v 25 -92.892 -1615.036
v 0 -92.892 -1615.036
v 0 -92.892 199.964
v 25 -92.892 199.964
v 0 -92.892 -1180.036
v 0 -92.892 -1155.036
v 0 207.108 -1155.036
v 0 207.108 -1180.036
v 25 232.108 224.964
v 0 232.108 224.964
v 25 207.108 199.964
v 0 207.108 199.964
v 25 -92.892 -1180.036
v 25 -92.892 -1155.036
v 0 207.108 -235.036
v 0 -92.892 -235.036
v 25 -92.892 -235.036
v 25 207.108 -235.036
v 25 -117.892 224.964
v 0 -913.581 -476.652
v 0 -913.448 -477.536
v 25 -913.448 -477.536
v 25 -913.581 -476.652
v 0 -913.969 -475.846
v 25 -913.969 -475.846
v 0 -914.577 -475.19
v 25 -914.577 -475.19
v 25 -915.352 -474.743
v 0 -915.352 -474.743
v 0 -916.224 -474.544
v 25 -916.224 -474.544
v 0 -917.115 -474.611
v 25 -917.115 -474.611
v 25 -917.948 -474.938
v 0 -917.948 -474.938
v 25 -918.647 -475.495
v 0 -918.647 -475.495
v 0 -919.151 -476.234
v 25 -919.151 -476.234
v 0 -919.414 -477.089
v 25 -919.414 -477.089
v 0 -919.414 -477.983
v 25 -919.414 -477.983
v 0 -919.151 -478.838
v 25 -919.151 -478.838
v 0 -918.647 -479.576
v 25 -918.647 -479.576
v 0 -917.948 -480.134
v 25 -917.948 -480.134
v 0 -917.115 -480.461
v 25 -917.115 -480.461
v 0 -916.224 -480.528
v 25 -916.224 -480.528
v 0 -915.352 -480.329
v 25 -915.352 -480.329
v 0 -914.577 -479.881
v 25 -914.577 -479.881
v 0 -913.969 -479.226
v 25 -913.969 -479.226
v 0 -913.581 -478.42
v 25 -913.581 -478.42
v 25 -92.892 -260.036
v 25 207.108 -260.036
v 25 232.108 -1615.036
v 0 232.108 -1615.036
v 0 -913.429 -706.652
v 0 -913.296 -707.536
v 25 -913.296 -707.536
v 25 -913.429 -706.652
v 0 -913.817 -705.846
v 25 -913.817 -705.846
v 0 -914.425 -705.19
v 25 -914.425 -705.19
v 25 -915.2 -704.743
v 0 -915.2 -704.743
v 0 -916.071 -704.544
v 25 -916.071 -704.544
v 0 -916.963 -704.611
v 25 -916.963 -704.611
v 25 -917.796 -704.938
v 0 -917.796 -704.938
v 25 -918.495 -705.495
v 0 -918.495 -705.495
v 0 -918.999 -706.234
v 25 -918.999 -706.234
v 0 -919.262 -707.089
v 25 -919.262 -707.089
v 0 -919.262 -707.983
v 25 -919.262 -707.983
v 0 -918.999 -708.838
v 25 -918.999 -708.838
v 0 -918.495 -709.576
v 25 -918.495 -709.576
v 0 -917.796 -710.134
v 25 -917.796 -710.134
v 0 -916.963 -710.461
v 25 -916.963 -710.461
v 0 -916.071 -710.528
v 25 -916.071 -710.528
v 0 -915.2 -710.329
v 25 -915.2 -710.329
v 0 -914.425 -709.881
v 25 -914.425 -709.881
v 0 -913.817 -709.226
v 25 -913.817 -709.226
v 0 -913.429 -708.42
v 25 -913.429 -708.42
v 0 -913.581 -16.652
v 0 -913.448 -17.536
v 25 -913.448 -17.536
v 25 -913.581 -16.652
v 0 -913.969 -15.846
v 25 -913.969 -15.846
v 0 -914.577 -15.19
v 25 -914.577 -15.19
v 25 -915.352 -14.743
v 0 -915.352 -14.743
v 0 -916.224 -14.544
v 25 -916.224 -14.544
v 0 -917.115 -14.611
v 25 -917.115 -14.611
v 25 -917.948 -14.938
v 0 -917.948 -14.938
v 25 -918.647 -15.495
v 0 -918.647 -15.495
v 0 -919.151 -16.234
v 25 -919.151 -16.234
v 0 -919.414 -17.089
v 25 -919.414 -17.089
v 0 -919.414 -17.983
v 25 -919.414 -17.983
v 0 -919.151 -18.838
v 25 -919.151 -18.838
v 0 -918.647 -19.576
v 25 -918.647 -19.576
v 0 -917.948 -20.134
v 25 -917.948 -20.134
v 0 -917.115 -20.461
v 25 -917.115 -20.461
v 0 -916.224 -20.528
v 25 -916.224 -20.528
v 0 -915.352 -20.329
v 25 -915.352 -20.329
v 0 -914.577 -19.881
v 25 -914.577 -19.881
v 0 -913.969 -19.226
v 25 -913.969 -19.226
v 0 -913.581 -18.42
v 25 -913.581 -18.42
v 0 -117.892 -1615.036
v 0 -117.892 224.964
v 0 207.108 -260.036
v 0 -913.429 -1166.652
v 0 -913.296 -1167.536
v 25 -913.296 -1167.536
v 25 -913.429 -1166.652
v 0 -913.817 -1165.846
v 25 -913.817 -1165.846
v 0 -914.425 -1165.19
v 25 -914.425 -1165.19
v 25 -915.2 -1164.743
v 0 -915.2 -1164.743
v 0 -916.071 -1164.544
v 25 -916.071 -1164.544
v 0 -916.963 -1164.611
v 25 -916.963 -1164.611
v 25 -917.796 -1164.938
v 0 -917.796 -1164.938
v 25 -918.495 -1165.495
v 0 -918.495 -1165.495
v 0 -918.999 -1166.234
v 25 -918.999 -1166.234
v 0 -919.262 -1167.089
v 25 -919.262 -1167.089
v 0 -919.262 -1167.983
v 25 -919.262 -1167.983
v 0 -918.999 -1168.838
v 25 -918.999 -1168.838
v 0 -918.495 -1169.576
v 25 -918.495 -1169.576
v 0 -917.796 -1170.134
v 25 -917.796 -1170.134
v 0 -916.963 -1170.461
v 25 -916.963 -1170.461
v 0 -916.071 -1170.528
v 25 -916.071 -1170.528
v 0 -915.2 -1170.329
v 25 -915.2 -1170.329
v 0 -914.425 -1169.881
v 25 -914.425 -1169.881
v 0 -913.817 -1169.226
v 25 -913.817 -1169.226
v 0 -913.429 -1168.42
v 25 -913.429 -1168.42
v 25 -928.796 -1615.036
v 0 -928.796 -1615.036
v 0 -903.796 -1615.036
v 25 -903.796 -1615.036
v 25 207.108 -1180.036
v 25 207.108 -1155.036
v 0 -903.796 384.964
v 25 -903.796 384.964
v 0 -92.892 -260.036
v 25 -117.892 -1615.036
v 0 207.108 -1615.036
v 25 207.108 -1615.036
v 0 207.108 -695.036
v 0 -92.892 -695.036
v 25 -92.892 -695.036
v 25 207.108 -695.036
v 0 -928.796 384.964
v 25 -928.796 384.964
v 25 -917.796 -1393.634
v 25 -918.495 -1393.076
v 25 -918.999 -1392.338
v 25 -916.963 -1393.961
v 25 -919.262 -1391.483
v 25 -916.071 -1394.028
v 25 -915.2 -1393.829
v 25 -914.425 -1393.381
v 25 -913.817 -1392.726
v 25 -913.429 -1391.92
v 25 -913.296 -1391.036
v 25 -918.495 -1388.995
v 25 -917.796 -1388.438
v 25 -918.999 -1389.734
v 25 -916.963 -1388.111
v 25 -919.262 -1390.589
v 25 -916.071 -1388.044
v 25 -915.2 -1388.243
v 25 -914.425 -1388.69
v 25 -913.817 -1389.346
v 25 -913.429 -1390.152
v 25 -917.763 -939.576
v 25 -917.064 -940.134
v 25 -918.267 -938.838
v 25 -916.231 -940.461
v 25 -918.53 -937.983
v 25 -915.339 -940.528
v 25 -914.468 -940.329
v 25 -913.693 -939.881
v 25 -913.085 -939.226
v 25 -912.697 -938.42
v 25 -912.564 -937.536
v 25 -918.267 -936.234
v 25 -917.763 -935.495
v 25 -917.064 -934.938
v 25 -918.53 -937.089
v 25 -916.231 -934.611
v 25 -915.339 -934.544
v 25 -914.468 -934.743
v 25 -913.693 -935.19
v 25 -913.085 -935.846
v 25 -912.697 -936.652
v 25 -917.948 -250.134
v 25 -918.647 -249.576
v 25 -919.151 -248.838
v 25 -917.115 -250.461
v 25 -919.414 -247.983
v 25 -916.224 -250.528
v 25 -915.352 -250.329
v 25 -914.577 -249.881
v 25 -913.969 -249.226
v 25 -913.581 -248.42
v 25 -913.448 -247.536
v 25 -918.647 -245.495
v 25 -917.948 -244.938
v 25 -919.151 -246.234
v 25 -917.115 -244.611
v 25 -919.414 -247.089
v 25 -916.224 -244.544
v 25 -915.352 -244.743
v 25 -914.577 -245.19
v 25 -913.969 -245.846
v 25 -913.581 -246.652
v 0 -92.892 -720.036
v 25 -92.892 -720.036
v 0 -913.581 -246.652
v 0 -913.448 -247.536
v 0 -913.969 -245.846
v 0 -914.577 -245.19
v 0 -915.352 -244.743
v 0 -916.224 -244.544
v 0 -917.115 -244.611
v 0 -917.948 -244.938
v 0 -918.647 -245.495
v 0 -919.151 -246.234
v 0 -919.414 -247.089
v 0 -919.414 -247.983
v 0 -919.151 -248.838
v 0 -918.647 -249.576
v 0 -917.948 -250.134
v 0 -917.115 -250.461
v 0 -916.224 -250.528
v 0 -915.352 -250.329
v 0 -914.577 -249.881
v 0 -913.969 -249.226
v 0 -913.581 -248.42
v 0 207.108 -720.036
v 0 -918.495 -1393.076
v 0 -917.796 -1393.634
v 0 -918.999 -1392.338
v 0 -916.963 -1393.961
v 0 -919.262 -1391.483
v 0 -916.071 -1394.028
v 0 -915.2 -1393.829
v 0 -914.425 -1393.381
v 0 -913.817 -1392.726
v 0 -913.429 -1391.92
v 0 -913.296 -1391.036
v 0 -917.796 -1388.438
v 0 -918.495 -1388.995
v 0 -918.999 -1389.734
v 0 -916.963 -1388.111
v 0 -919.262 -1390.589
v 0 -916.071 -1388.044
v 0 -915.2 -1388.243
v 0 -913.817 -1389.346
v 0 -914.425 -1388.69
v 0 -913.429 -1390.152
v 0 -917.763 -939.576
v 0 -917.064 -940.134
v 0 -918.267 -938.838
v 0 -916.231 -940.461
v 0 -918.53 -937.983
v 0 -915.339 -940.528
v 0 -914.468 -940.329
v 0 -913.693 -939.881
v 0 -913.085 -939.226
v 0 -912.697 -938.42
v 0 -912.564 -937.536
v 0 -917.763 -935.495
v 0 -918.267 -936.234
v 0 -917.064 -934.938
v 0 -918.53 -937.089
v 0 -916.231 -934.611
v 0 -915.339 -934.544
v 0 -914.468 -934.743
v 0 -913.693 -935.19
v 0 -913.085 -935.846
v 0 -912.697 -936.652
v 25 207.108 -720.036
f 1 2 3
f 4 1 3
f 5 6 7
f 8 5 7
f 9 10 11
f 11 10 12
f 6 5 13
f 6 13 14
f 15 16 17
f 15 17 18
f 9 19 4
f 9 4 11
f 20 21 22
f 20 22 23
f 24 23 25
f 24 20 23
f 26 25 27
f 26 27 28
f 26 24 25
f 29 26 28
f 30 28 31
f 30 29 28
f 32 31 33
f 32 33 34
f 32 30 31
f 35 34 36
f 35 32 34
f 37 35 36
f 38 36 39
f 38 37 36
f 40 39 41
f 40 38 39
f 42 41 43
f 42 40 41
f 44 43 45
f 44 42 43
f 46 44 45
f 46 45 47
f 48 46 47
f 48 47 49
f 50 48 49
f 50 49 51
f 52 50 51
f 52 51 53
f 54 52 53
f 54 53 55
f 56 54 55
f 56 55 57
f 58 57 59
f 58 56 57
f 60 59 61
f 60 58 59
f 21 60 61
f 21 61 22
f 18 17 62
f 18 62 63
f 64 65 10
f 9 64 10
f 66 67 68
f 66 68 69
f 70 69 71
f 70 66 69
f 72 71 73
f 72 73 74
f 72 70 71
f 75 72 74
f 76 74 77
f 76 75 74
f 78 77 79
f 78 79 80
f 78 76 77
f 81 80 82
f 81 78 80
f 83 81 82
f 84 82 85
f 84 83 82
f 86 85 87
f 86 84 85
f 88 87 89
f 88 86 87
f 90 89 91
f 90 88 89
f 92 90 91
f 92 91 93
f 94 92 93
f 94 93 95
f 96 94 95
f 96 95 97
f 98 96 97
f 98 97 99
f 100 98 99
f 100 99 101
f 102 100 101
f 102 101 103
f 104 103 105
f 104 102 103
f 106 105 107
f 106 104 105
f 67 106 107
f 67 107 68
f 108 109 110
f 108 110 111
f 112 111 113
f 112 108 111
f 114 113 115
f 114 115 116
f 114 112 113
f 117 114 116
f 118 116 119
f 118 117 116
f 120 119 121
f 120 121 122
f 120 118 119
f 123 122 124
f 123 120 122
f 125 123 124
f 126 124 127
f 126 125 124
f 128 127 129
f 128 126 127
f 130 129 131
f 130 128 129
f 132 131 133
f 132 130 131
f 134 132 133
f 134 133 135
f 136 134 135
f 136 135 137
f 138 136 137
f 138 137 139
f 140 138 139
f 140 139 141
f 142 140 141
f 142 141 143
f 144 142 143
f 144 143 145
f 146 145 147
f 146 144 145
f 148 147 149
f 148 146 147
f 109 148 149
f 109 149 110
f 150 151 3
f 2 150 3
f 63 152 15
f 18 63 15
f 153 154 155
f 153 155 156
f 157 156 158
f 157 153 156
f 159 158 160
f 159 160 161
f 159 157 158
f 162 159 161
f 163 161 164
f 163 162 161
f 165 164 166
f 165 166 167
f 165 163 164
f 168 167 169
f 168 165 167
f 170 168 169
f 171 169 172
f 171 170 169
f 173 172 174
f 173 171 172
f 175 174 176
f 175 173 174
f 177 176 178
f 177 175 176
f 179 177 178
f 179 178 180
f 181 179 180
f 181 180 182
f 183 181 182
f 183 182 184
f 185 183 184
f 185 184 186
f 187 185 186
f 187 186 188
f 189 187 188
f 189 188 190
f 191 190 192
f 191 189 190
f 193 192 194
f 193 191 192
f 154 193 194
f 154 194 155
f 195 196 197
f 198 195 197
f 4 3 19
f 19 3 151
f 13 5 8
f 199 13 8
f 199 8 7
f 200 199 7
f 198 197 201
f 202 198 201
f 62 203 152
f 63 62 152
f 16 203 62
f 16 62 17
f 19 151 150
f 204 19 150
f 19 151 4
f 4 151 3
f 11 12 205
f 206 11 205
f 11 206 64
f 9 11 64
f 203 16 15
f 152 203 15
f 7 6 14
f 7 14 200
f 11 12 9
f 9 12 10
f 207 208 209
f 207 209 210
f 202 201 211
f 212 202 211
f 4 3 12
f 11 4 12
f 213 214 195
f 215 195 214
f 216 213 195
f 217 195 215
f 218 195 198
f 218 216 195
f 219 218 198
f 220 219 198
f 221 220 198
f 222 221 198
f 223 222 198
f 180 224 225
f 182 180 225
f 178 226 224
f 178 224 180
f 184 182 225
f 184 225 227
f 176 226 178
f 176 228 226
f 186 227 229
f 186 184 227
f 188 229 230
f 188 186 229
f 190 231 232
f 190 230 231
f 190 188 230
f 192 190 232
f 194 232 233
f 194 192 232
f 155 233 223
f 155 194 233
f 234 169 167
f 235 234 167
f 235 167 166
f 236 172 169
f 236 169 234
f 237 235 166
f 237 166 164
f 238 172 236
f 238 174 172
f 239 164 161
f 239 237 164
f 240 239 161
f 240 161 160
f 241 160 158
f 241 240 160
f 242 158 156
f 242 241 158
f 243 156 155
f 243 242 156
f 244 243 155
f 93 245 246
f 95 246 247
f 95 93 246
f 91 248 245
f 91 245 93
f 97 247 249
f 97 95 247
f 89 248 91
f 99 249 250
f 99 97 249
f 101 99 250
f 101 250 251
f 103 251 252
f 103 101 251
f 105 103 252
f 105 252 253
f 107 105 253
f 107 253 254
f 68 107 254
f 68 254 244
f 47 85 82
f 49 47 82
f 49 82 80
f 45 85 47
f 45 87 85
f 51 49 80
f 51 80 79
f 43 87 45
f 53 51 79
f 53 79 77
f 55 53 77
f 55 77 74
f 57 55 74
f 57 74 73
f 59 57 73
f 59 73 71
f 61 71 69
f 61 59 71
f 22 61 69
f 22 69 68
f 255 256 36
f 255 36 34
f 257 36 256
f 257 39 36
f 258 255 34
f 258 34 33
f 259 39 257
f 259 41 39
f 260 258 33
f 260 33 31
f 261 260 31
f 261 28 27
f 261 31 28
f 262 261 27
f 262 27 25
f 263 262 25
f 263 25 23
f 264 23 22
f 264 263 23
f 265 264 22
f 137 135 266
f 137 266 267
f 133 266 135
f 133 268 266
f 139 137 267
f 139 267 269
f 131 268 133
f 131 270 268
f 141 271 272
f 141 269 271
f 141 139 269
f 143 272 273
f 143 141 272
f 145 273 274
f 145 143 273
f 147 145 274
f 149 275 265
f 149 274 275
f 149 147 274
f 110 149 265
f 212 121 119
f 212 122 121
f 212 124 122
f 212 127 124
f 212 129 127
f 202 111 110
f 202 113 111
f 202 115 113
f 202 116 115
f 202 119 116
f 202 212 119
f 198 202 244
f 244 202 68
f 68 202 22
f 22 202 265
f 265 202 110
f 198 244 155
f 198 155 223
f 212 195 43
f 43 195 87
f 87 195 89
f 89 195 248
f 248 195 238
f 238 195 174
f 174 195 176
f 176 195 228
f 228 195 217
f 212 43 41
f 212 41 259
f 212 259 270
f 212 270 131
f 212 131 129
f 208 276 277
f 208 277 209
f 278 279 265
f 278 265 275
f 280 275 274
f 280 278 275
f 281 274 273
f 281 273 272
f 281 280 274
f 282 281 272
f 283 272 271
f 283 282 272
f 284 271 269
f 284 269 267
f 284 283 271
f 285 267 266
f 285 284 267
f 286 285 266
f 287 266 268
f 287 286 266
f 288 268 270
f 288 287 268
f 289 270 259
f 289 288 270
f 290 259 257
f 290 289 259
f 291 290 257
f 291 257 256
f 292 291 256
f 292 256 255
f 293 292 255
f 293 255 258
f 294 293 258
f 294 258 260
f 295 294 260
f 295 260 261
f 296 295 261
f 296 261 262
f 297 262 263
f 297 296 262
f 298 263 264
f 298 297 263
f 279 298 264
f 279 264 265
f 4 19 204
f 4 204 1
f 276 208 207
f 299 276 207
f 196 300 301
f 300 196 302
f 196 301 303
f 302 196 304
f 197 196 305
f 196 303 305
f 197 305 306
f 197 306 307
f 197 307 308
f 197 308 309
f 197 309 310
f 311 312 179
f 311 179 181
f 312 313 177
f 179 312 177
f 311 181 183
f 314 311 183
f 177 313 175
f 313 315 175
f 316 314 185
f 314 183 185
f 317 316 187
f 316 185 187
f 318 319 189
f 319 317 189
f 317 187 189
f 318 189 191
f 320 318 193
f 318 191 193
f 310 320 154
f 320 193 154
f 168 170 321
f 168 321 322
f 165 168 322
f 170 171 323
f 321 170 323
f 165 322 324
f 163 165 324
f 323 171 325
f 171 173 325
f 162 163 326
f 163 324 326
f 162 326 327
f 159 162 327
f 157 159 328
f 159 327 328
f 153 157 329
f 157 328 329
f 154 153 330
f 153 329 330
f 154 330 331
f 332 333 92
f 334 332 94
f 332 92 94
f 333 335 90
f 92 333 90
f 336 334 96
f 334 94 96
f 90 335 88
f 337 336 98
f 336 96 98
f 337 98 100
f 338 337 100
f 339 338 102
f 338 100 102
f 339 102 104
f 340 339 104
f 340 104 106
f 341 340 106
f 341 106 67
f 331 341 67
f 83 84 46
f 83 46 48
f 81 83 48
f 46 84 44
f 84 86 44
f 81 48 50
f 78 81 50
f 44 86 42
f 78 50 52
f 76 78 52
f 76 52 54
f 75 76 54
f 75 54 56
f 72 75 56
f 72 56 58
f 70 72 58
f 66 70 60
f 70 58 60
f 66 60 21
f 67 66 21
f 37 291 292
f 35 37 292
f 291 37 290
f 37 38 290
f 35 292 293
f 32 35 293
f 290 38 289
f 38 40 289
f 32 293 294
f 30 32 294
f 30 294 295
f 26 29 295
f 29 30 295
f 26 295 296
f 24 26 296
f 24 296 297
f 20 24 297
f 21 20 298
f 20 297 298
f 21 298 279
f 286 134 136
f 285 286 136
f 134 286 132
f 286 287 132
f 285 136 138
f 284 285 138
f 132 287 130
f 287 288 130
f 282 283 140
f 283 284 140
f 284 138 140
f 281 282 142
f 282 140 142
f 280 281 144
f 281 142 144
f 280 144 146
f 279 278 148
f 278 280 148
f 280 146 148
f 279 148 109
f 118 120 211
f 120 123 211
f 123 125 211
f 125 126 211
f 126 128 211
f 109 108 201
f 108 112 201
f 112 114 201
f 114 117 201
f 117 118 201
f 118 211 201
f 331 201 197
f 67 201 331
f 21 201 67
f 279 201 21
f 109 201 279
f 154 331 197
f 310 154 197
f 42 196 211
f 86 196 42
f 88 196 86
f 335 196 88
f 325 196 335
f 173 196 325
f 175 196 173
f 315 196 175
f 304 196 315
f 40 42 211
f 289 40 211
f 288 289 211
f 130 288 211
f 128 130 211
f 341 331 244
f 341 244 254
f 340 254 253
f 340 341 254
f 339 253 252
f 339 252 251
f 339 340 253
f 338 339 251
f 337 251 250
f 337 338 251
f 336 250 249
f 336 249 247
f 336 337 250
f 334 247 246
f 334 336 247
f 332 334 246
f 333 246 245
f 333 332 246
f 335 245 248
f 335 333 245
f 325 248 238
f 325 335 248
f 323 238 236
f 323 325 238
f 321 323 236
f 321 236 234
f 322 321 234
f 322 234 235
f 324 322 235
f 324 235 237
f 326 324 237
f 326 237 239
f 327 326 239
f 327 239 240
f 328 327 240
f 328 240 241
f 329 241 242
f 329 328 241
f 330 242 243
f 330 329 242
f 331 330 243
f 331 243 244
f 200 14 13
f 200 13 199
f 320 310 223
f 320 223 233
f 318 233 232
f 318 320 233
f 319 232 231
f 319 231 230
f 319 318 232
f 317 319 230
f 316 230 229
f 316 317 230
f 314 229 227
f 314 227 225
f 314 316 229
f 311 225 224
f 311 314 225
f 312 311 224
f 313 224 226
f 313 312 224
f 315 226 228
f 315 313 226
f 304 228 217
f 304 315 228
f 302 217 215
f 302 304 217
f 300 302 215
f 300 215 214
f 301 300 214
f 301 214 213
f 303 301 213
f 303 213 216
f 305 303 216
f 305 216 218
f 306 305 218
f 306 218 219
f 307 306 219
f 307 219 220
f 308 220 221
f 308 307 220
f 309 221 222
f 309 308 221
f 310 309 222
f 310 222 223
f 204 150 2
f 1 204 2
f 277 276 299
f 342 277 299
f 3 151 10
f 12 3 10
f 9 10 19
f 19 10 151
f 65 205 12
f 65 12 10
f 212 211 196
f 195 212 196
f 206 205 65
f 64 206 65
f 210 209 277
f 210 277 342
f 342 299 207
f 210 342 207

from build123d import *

# Parameters (mm, degrees)
F0_R     = 3
F1_DEPTH = 25
F0_W     = 300
F0_H     = 25
F2_DEPTH = 25


with BuildPart() as f1:
    # F0 (on Right) → F1 (new body)
    with BuildSketch(Plane.YZ):
        Polygon((-117.891654, 224.964024), (-117.891654, -1615.035976), (-92.891654, -1615.035976), (-92.891654, -1180.035976), (-92.891654, -1155.035976), (-92.891654, -720.035976), (-92.891654, -695.035976), (-92.891654, -260.035976), (-92.891654, -235.035976), (-92.891654, 199.964024), align=None)
        Polygon((232.108346, -1615.035976), (232.108346, 224.964024), (207.108346, 199.964024), (207.108346, -235.035976), (207.108346, -260.035976), (207.108346, -695.035976), (207.108346, -720.035976), (207.108346, -1155.035976), (207.108346, -1180.035976), (207.108346, -1615.035976), align=None)
        Polygon((-903.795616, -1615.035976), (-903.795616, 224.964024), (-903.795616, 384.964024), (-928.795616, 384.964024), (-928.795616, -1615.035976), align=None)
        with Locations((-916.295616, -1391.035976)):
            Circle(F0_R, mode=Mode.SUBTRACT)
        with Locations((-916.295616, -1167.535976)):
            Circle(F0_R, mode=Mode.SUBTRACT)
        with Locations((-915.563614, -937.535976)):
            Circle(F0_R, mode=Mode.SUBTRACT)
        with Locations((-916.295616, -707.535976)):
            Circle(F0_R, mode=Mode.SUBTRACT)
        with Locations((-916.447908, -477.535976)):
            Circle(F0_R, mode=Mode.SUBTRACT)
        with Locations((-916.447908, -247.535976)):
            Circle(F0_R, mode=Mode.SUBTRACT)
        with Locations((-916.447908, -17.535976)):
            Circle(F0_R, mode=Mode.SUBTRACT)
    extrude(amount=F1_DEPTH)


with BuildPart() as f2:
    # F0 (on Right) → F2 (new body)
    with BuildSketch(Plane.YZ):
        Polygon((232.108346, 224.964024), (-117.891654, 224.964024), (-92.891654, 199.964024), (207.108346, 199.964024), align=None)
        with Locations((57.108346, -247.535976)):
            Rectangle(F0_W, F0_H)
        with Locations((57.108346, -707.535976)):
            Rectangle(F0_W, F0_H)
        with Locations((57.108346, -1167.535976)):
            Rectangle(F0_W, F0_H)
    extrude(amount=F2_DEPTH)


solid = Compound([f1.part, f2.part])
